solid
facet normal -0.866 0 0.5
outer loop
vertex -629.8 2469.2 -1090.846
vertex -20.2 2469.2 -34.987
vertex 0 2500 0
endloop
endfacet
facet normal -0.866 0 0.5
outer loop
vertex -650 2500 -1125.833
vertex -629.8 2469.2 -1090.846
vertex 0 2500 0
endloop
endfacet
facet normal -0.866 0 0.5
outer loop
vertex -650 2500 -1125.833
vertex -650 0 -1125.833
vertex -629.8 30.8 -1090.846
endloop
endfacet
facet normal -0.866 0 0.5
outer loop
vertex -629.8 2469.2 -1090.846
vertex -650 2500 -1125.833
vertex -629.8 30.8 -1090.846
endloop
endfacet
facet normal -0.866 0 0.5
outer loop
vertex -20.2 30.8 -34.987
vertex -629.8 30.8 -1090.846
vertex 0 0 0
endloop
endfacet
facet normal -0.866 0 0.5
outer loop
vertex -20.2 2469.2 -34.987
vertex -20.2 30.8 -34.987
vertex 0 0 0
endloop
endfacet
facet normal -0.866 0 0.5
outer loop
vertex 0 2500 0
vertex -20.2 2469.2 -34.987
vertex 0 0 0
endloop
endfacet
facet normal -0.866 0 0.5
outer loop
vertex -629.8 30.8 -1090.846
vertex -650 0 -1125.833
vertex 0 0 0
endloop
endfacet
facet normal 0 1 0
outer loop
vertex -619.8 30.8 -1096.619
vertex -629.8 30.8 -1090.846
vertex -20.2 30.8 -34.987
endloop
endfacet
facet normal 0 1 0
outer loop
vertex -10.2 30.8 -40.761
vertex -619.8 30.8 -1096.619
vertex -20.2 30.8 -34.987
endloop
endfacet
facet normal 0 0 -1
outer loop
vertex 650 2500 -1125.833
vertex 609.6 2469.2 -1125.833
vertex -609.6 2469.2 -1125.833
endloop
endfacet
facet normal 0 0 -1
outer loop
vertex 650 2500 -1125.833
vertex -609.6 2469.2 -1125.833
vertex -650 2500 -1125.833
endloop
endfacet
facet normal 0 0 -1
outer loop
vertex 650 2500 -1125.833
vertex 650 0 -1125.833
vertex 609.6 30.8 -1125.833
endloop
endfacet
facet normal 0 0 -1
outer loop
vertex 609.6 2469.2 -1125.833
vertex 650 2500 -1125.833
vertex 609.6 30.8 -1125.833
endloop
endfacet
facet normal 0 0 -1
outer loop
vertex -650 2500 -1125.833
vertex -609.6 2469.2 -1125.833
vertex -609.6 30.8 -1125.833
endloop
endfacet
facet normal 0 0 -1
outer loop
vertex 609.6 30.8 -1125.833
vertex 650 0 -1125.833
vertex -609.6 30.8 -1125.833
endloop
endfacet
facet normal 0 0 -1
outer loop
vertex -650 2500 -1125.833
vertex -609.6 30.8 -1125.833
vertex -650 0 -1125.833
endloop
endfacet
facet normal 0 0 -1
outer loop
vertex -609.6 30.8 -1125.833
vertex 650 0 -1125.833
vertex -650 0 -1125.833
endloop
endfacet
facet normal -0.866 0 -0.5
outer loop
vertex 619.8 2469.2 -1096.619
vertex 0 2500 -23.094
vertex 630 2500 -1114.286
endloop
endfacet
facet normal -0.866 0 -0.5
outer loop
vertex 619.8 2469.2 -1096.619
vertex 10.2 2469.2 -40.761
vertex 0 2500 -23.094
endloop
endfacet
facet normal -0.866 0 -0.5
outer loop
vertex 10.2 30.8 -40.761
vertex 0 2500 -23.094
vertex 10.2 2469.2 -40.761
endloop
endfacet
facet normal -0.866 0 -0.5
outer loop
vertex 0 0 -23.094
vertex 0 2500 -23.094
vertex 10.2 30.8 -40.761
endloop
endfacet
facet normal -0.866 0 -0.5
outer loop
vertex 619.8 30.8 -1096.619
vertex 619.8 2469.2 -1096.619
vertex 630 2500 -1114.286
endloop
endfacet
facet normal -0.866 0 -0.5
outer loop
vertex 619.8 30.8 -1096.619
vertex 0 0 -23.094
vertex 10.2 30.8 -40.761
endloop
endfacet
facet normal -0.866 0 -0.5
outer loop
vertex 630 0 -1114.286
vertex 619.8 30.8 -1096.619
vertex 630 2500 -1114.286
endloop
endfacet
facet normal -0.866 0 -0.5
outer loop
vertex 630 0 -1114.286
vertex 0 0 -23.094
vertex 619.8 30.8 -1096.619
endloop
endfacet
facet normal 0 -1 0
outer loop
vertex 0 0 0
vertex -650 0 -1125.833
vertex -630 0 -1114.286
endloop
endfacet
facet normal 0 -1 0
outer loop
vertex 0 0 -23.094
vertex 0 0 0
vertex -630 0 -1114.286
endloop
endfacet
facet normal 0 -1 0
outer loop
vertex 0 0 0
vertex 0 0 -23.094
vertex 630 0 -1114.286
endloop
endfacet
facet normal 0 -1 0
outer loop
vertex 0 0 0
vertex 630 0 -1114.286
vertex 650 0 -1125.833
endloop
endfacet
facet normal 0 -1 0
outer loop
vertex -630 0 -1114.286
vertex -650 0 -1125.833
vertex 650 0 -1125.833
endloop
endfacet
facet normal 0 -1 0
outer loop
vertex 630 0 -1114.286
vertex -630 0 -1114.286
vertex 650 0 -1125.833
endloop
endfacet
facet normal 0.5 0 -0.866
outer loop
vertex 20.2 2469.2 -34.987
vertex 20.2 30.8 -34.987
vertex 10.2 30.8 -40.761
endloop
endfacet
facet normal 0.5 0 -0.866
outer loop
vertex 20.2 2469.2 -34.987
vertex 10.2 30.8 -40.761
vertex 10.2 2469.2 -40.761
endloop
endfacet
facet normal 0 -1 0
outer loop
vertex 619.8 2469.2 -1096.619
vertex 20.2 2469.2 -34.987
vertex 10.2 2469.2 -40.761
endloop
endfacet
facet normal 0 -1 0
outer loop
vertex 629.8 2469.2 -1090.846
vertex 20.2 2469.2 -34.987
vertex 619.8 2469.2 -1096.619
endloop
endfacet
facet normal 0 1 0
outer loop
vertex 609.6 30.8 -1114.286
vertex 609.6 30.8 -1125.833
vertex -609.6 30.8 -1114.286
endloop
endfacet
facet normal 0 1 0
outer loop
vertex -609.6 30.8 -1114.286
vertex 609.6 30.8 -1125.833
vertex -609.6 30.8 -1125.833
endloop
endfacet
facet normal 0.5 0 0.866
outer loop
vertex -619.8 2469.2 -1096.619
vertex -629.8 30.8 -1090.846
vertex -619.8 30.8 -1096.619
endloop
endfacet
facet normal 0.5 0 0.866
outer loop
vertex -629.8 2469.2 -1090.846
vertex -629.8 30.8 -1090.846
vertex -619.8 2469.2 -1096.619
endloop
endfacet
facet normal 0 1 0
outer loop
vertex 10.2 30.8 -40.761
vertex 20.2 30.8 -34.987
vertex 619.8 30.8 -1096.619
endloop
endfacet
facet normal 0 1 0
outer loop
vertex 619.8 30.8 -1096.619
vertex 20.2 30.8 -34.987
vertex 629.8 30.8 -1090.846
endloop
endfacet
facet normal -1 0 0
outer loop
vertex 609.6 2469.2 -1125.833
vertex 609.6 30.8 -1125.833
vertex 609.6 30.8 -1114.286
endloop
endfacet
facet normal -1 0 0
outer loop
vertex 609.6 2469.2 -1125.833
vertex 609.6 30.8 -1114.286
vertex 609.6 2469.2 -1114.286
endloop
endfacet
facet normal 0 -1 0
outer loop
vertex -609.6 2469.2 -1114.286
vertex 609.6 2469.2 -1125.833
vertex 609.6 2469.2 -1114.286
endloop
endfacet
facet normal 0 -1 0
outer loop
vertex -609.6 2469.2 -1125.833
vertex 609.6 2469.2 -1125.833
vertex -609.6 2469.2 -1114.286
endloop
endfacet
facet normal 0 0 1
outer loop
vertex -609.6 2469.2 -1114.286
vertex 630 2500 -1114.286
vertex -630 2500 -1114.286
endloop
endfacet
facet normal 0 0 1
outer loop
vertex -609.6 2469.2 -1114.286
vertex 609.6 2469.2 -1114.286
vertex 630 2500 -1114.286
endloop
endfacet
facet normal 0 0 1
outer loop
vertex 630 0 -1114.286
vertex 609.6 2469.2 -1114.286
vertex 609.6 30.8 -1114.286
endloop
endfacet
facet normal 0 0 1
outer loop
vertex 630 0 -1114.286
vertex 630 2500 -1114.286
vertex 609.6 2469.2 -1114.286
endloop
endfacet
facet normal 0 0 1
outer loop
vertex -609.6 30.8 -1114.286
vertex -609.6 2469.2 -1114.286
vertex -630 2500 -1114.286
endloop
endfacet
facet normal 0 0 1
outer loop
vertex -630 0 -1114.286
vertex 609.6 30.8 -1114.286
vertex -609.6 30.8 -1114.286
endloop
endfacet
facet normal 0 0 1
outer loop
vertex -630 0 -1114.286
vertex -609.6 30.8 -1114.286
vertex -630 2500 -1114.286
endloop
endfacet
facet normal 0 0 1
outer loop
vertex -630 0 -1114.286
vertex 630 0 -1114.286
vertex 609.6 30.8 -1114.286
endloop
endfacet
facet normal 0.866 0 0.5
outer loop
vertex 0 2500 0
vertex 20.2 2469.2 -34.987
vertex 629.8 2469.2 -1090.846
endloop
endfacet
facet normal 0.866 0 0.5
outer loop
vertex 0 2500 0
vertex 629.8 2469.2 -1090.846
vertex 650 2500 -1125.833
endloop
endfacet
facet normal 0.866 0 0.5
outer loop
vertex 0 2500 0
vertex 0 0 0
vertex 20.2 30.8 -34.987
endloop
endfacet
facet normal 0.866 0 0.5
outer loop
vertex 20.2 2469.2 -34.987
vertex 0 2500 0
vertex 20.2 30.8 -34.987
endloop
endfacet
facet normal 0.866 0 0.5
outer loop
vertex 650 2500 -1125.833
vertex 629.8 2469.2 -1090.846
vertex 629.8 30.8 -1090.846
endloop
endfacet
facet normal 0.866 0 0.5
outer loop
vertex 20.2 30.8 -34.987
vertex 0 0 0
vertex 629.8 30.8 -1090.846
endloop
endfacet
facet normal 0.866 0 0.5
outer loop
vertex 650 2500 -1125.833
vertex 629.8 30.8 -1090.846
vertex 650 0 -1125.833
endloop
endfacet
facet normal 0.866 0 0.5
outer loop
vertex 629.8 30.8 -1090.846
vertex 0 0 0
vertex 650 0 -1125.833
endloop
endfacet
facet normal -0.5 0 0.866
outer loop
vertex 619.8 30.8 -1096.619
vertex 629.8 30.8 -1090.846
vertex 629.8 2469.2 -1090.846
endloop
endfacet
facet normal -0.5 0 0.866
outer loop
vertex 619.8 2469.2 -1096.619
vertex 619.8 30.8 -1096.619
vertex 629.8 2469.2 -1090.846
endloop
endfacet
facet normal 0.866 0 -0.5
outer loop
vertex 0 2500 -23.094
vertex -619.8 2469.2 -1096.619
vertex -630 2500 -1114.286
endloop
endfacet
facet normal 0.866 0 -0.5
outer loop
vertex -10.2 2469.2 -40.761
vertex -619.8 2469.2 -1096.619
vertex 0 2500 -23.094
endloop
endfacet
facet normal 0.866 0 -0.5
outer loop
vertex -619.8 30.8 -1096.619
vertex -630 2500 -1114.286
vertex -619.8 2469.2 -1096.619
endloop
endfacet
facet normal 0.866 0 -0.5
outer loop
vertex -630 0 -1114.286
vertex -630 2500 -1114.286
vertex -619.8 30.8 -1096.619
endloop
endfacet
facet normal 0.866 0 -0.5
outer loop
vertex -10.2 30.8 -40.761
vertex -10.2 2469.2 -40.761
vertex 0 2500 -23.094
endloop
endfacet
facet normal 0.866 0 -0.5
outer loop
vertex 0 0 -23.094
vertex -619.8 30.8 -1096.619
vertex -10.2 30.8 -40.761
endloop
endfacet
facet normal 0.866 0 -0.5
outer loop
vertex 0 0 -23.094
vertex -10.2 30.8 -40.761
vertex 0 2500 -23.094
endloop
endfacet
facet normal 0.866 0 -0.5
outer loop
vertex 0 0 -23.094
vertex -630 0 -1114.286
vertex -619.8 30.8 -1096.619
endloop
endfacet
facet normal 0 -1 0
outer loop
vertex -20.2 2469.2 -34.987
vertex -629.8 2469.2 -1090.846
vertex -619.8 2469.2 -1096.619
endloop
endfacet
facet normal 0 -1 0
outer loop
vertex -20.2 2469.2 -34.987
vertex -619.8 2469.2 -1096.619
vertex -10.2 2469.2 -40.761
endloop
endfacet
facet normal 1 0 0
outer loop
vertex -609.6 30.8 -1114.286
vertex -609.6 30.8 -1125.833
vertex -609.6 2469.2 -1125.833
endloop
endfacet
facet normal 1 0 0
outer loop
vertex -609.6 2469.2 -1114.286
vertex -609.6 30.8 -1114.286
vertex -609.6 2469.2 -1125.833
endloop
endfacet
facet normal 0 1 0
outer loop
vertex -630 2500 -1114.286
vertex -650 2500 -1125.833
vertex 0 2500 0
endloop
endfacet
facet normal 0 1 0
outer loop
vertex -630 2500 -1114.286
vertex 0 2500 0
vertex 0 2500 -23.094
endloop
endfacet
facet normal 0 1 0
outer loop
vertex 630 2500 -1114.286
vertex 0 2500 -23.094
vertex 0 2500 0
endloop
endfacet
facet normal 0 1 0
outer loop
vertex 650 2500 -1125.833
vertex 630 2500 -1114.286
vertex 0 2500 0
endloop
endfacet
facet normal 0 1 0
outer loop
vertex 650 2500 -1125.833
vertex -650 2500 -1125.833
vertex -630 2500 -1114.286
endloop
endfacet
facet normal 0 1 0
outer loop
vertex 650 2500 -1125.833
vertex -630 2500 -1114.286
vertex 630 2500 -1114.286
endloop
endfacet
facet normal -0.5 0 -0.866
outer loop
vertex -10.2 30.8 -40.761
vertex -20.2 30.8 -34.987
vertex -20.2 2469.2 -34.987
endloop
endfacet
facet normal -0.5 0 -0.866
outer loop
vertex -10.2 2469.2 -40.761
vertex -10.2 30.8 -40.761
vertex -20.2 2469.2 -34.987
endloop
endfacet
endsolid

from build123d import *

# Parameters (mm, degrees)
BOSS_EXTRUDE2_DEPTH = 2500
SKETCH4_W           = 1219.2
SKETCH4_H           = 2438.4
CUT_EXTRUDE2_DEPTH  = 21
SKETCH5_W           = 1219.2
SKETCH5_H           = 2438.4
CUT_EXTRUDE3_DEPTH  = 21
SKETCH6_W           = 1219.2
SKETCH6_H           = 2438.4
CUT_EXTRUDE4_DEPTH  = 21


with BuildPart() as part:
    # Sketch1 → Boss-Extrude2 (new body)
    with BuildSketch(Plane(origin=(0, 0, 0), x_dir=(1, 0, 0), z_dir=(0, 1, 0))):
        Polygon((0, 0), (650, 1125.83302492), (-650, 1125.83302492), align=None)
        Polygon((0, 23.094010768), (630, 1114.286019536), (-630, 1114.286019536), align=None, mode=Mode.SUBTRACT)
    extrude(amount=BOSS_EXTRUDE2_DEPTH)

    # Sketch4 → Cut-Extrude2 (cut)
    with BuildSketch(Plane(origin=(0, 0, -1125.83302492), x_dir=(-1, 0, 0), z_dir=(0, 0, -1))):
        with Locations((0, 1250)):
            Rectangle(SKETCH4_W, SKETCH4_H)
    extrude(amount=-CUT_EXTRUDE2_DEPTH, mode=Mode.SUBTRACT)

    # Sketch5 → Cut-Extrude3 (cut)
    with BuildSketch(Plane(origin=(0, 0, 0), x_dir=(0.5000000000000001, 0, 0.8660254037844386), z_dir=(-0.8660254037844386, 0, 0.5000000000000001))):
        with Locations((-650, 1250)):
            Rectangle(SKETCH5_W, SKETCH5_H)
    extrude(amount=-CUT_EXTRUDE3_DEPTH, mode=Mode.SUBTRACT)

    # Sketch6 → Cut-Extrude4 (cut)
    with BuildSketch(Plane(origin=(0, 0, 0), x_dir=(0.4999999999999999, 0, -0.8660254037844386), z_dir=(0.8660254037844387, 0, 0.49999999999999994))):
        with Locations((650, 1250)):
            Rectangle(SKETCH6_W, SKETCH6_H)
    extrude(amount=-CUT_EXTRUDE4_DEPTH, mode=Mode.SUBTRACT)


solid = part.part
